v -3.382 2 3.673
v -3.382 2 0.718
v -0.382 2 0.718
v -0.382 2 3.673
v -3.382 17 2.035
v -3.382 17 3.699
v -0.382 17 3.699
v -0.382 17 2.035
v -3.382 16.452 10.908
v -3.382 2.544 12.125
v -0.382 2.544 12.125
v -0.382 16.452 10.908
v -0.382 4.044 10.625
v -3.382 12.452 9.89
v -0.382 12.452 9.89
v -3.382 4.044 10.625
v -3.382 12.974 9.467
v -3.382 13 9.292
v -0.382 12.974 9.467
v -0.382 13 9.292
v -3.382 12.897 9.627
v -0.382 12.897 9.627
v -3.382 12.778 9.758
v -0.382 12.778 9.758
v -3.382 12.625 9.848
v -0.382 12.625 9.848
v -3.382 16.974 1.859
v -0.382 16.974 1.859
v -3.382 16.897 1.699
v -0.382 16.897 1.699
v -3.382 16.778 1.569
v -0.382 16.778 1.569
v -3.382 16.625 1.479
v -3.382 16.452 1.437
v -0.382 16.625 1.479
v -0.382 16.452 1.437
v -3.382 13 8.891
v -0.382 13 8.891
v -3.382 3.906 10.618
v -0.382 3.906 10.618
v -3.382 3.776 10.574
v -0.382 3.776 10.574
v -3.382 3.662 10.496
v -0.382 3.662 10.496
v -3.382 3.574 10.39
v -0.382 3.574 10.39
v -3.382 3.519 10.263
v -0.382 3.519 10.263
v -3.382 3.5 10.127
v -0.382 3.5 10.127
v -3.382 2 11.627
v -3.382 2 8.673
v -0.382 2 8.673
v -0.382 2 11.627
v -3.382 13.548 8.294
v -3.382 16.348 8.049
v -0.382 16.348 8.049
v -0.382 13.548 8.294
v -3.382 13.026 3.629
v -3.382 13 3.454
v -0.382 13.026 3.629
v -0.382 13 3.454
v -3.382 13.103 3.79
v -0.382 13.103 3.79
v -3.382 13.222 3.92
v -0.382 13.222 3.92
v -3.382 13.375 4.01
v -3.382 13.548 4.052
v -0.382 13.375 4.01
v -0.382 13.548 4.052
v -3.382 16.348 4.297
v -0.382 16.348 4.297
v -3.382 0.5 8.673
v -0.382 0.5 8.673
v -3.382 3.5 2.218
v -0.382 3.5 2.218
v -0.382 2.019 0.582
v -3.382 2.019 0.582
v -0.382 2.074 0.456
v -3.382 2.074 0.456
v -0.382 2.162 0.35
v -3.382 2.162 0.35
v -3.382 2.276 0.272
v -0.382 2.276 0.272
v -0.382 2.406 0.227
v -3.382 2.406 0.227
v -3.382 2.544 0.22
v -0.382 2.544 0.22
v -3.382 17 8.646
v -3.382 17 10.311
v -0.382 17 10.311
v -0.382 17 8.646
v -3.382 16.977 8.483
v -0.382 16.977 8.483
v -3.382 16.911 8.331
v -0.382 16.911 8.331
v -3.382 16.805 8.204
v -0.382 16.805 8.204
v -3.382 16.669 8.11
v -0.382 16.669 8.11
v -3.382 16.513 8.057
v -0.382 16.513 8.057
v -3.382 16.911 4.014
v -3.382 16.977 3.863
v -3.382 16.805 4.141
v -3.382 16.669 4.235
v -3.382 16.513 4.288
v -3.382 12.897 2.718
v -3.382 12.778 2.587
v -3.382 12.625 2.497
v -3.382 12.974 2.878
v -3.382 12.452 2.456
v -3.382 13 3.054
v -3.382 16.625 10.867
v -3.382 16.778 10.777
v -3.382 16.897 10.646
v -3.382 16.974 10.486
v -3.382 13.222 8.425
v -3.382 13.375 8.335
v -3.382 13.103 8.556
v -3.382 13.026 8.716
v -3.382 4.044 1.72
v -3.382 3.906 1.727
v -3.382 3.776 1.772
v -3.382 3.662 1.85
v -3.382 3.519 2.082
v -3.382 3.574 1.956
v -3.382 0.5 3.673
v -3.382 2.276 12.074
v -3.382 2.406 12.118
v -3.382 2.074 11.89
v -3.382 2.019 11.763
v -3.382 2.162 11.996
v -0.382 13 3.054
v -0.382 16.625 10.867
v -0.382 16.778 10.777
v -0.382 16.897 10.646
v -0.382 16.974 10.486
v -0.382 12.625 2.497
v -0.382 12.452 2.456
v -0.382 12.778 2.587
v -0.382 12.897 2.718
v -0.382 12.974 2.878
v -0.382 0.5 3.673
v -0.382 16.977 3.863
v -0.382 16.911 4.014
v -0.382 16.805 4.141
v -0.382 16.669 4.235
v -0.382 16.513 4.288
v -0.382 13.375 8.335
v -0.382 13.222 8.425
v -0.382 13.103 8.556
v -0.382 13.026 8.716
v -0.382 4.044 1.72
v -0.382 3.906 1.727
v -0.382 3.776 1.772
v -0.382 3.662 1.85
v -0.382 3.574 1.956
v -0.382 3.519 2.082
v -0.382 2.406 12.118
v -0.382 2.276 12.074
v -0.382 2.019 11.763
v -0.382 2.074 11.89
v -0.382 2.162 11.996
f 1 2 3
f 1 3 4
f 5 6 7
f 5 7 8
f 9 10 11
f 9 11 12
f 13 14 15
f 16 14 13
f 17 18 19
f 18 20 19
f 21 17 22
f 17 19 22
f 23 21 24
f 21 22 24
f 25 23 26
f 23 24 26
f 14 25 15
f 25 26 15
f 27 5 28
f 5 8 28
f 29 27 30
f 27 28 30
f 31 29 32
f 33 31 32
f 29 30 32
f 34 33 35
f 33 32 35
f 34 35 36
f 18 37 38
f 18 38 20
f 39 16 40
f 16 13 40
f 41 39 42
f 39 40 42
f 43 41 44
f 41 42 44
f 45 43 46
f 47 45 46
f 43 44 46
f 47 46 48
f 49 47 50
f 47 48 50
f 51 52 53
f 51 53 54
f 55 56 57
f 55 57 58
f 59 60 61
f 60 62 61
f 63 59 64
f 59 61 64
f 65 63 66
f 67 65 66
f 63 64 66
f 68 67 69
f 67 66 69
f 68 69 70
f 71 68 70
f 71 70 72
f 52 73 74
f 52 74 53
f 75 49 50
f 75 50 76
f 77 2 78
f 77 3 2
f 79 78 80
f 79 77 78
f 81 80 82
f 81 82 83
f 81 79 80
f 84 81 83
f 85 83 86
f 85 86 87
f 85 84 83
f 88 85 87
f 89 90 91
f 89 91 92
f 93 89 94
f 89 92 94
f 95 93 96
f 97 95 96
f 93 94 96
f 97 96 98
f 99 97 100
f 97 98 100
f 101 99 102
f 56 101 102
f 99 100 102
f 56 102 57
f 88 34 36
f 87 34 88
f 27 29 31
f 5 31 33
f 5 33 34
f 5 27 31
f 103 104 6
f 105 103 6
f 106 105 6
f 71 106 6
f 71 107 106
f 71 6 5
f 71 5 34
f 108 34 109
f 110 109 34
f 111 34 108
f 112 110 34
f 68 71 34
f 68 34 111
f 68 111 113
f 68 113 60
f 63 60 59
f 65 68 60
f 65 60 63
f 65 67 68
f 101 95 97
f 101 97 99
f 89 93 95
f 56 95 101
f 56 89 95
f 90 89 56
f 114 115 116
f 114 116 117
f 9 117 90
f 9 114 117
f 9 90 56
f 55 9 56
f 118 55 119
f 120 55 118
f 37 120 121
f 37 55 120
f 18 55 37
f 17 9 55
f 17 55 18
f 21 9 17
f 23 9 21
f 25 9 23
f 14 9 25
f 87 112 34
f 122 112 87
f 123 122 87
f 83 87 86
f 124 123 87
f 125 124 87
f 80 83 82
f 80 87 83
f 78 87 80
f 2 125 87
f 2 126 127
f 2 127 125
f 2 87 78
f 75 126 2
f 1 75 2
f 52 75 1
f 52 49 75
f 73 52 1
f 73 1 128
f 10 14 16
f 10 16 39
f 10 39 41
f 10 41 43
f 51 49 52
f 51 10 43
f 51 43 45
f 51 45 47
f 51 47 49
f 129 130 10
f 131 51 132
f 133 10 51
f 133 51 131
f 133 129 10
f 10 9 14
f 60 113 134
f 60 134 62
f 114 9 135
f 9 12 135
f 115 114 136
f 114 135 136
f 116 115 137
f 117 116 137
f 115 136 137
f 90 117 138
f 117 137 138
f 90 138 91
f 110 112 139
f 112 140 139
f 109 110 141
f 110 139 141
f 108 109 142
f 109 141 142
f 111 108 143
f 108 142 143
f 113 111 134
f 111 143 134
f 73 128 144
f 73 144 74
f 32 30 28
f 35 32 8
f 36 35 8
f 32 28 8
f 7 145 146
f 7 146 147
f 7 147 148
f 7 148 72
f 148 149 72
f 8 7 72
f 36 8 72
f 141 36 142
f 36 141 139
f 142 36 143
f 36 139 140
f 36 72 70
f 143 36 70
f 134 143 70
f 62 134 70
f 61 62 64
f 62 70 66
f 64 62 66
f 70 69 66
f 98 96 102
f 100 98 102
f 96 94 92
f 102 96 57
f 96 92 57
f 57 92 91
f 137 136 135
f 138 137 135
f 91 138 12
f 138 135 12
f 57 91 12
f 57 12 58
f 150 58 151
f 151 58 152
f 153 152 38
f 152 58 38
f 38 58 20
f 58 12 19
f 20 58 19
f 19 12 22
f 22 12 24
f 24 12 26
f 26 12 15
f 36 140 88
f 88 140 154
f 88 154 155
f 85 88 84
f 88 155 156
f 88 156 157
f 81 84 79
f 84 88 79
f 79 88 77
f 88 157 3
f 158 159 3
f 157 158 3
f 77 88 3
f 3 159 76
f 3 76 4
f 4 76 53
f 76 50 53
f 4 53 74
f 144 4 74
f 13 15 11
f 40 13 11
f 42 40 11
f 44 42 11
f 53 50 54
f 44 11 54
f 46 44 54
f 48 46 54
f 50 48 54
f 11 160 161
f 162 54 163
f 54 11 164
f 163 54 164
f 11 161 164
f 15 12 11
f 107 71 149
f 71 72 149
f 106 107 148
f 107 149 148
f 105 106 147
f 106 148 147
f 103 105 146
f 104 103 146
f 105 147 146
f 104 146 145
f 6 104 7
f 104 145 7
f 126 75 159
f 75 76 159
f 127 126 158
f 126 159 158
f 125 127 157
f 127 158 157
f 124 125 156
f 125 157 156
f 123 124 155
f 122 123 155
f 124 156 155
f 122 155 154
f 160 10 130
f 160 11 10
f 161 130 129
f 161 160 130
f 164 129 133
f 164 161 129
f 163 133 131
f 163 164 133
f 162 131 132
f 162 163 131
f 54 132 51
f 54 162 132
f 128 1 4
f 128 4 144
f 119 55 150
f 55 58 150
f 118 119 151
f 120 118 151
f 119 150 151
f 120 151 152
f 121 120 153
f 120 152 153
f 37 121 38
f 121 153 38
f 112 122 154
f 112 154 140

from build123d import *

# Parameters (mm, degrees)
PAD001_DEPTH = 3
FILLET001_R  = 0.6
FILLET002_R  = 0.5


with BuildPart() as part:
    # Sketch002 (on DatumPlane) → Pad001 (new body)
    with BuildSketch(Plane.YZ.offset(-3.381818)):
        Polygon((2, 12.172727), (17, 10.860397), (17, 7.99163), (13, 8.341585), (13, 9.841585), (3.5, 10.672727), (3.5, 1.672727), (13, 2.50387), (13, 4.00387), (17, 4.353824), (17, 1.485057), (2, 0.172727), (2, 3.672727), (0.5, 3.672727), (0.5, 8.672727), (2, 8.672727), align=None)
    extrude(amount=PAD001_DEPTH)

    # Fillet001
    fillet001_edges = [part.edges().sort_by_distance(p)[0] for p in [
        (-1.881818, 17, 4.353824),
        (-1.881818, 17, 10.860397),
        (-1.881818, 17, 7.99163),
        (-1.881818, 17, 1.485057),
        (-1.881818, 13, 8.341585),
        (-1.881818, 13, 4.00387),
        (-1.881818, 13, 2.50387),
        (-1.881818, 13, 9.841585),
    ]]
    fillet(fillet001_edges, radius=FILLET001_R)

    # Fillet002
    fillet002_edges = [part.edges().sort_by_distance(p)[0] for p in [
        (-1.881818, 2, 0.172727),
        (-1.881818, 3.5, 1.672727),
        (-1.881818, 3.5, 10.672727),
        (-1.881818, 2, 12.172727),
    ]]
    fillet(fillet002_edges, radius=FILLET002_R)


solid = part.part
